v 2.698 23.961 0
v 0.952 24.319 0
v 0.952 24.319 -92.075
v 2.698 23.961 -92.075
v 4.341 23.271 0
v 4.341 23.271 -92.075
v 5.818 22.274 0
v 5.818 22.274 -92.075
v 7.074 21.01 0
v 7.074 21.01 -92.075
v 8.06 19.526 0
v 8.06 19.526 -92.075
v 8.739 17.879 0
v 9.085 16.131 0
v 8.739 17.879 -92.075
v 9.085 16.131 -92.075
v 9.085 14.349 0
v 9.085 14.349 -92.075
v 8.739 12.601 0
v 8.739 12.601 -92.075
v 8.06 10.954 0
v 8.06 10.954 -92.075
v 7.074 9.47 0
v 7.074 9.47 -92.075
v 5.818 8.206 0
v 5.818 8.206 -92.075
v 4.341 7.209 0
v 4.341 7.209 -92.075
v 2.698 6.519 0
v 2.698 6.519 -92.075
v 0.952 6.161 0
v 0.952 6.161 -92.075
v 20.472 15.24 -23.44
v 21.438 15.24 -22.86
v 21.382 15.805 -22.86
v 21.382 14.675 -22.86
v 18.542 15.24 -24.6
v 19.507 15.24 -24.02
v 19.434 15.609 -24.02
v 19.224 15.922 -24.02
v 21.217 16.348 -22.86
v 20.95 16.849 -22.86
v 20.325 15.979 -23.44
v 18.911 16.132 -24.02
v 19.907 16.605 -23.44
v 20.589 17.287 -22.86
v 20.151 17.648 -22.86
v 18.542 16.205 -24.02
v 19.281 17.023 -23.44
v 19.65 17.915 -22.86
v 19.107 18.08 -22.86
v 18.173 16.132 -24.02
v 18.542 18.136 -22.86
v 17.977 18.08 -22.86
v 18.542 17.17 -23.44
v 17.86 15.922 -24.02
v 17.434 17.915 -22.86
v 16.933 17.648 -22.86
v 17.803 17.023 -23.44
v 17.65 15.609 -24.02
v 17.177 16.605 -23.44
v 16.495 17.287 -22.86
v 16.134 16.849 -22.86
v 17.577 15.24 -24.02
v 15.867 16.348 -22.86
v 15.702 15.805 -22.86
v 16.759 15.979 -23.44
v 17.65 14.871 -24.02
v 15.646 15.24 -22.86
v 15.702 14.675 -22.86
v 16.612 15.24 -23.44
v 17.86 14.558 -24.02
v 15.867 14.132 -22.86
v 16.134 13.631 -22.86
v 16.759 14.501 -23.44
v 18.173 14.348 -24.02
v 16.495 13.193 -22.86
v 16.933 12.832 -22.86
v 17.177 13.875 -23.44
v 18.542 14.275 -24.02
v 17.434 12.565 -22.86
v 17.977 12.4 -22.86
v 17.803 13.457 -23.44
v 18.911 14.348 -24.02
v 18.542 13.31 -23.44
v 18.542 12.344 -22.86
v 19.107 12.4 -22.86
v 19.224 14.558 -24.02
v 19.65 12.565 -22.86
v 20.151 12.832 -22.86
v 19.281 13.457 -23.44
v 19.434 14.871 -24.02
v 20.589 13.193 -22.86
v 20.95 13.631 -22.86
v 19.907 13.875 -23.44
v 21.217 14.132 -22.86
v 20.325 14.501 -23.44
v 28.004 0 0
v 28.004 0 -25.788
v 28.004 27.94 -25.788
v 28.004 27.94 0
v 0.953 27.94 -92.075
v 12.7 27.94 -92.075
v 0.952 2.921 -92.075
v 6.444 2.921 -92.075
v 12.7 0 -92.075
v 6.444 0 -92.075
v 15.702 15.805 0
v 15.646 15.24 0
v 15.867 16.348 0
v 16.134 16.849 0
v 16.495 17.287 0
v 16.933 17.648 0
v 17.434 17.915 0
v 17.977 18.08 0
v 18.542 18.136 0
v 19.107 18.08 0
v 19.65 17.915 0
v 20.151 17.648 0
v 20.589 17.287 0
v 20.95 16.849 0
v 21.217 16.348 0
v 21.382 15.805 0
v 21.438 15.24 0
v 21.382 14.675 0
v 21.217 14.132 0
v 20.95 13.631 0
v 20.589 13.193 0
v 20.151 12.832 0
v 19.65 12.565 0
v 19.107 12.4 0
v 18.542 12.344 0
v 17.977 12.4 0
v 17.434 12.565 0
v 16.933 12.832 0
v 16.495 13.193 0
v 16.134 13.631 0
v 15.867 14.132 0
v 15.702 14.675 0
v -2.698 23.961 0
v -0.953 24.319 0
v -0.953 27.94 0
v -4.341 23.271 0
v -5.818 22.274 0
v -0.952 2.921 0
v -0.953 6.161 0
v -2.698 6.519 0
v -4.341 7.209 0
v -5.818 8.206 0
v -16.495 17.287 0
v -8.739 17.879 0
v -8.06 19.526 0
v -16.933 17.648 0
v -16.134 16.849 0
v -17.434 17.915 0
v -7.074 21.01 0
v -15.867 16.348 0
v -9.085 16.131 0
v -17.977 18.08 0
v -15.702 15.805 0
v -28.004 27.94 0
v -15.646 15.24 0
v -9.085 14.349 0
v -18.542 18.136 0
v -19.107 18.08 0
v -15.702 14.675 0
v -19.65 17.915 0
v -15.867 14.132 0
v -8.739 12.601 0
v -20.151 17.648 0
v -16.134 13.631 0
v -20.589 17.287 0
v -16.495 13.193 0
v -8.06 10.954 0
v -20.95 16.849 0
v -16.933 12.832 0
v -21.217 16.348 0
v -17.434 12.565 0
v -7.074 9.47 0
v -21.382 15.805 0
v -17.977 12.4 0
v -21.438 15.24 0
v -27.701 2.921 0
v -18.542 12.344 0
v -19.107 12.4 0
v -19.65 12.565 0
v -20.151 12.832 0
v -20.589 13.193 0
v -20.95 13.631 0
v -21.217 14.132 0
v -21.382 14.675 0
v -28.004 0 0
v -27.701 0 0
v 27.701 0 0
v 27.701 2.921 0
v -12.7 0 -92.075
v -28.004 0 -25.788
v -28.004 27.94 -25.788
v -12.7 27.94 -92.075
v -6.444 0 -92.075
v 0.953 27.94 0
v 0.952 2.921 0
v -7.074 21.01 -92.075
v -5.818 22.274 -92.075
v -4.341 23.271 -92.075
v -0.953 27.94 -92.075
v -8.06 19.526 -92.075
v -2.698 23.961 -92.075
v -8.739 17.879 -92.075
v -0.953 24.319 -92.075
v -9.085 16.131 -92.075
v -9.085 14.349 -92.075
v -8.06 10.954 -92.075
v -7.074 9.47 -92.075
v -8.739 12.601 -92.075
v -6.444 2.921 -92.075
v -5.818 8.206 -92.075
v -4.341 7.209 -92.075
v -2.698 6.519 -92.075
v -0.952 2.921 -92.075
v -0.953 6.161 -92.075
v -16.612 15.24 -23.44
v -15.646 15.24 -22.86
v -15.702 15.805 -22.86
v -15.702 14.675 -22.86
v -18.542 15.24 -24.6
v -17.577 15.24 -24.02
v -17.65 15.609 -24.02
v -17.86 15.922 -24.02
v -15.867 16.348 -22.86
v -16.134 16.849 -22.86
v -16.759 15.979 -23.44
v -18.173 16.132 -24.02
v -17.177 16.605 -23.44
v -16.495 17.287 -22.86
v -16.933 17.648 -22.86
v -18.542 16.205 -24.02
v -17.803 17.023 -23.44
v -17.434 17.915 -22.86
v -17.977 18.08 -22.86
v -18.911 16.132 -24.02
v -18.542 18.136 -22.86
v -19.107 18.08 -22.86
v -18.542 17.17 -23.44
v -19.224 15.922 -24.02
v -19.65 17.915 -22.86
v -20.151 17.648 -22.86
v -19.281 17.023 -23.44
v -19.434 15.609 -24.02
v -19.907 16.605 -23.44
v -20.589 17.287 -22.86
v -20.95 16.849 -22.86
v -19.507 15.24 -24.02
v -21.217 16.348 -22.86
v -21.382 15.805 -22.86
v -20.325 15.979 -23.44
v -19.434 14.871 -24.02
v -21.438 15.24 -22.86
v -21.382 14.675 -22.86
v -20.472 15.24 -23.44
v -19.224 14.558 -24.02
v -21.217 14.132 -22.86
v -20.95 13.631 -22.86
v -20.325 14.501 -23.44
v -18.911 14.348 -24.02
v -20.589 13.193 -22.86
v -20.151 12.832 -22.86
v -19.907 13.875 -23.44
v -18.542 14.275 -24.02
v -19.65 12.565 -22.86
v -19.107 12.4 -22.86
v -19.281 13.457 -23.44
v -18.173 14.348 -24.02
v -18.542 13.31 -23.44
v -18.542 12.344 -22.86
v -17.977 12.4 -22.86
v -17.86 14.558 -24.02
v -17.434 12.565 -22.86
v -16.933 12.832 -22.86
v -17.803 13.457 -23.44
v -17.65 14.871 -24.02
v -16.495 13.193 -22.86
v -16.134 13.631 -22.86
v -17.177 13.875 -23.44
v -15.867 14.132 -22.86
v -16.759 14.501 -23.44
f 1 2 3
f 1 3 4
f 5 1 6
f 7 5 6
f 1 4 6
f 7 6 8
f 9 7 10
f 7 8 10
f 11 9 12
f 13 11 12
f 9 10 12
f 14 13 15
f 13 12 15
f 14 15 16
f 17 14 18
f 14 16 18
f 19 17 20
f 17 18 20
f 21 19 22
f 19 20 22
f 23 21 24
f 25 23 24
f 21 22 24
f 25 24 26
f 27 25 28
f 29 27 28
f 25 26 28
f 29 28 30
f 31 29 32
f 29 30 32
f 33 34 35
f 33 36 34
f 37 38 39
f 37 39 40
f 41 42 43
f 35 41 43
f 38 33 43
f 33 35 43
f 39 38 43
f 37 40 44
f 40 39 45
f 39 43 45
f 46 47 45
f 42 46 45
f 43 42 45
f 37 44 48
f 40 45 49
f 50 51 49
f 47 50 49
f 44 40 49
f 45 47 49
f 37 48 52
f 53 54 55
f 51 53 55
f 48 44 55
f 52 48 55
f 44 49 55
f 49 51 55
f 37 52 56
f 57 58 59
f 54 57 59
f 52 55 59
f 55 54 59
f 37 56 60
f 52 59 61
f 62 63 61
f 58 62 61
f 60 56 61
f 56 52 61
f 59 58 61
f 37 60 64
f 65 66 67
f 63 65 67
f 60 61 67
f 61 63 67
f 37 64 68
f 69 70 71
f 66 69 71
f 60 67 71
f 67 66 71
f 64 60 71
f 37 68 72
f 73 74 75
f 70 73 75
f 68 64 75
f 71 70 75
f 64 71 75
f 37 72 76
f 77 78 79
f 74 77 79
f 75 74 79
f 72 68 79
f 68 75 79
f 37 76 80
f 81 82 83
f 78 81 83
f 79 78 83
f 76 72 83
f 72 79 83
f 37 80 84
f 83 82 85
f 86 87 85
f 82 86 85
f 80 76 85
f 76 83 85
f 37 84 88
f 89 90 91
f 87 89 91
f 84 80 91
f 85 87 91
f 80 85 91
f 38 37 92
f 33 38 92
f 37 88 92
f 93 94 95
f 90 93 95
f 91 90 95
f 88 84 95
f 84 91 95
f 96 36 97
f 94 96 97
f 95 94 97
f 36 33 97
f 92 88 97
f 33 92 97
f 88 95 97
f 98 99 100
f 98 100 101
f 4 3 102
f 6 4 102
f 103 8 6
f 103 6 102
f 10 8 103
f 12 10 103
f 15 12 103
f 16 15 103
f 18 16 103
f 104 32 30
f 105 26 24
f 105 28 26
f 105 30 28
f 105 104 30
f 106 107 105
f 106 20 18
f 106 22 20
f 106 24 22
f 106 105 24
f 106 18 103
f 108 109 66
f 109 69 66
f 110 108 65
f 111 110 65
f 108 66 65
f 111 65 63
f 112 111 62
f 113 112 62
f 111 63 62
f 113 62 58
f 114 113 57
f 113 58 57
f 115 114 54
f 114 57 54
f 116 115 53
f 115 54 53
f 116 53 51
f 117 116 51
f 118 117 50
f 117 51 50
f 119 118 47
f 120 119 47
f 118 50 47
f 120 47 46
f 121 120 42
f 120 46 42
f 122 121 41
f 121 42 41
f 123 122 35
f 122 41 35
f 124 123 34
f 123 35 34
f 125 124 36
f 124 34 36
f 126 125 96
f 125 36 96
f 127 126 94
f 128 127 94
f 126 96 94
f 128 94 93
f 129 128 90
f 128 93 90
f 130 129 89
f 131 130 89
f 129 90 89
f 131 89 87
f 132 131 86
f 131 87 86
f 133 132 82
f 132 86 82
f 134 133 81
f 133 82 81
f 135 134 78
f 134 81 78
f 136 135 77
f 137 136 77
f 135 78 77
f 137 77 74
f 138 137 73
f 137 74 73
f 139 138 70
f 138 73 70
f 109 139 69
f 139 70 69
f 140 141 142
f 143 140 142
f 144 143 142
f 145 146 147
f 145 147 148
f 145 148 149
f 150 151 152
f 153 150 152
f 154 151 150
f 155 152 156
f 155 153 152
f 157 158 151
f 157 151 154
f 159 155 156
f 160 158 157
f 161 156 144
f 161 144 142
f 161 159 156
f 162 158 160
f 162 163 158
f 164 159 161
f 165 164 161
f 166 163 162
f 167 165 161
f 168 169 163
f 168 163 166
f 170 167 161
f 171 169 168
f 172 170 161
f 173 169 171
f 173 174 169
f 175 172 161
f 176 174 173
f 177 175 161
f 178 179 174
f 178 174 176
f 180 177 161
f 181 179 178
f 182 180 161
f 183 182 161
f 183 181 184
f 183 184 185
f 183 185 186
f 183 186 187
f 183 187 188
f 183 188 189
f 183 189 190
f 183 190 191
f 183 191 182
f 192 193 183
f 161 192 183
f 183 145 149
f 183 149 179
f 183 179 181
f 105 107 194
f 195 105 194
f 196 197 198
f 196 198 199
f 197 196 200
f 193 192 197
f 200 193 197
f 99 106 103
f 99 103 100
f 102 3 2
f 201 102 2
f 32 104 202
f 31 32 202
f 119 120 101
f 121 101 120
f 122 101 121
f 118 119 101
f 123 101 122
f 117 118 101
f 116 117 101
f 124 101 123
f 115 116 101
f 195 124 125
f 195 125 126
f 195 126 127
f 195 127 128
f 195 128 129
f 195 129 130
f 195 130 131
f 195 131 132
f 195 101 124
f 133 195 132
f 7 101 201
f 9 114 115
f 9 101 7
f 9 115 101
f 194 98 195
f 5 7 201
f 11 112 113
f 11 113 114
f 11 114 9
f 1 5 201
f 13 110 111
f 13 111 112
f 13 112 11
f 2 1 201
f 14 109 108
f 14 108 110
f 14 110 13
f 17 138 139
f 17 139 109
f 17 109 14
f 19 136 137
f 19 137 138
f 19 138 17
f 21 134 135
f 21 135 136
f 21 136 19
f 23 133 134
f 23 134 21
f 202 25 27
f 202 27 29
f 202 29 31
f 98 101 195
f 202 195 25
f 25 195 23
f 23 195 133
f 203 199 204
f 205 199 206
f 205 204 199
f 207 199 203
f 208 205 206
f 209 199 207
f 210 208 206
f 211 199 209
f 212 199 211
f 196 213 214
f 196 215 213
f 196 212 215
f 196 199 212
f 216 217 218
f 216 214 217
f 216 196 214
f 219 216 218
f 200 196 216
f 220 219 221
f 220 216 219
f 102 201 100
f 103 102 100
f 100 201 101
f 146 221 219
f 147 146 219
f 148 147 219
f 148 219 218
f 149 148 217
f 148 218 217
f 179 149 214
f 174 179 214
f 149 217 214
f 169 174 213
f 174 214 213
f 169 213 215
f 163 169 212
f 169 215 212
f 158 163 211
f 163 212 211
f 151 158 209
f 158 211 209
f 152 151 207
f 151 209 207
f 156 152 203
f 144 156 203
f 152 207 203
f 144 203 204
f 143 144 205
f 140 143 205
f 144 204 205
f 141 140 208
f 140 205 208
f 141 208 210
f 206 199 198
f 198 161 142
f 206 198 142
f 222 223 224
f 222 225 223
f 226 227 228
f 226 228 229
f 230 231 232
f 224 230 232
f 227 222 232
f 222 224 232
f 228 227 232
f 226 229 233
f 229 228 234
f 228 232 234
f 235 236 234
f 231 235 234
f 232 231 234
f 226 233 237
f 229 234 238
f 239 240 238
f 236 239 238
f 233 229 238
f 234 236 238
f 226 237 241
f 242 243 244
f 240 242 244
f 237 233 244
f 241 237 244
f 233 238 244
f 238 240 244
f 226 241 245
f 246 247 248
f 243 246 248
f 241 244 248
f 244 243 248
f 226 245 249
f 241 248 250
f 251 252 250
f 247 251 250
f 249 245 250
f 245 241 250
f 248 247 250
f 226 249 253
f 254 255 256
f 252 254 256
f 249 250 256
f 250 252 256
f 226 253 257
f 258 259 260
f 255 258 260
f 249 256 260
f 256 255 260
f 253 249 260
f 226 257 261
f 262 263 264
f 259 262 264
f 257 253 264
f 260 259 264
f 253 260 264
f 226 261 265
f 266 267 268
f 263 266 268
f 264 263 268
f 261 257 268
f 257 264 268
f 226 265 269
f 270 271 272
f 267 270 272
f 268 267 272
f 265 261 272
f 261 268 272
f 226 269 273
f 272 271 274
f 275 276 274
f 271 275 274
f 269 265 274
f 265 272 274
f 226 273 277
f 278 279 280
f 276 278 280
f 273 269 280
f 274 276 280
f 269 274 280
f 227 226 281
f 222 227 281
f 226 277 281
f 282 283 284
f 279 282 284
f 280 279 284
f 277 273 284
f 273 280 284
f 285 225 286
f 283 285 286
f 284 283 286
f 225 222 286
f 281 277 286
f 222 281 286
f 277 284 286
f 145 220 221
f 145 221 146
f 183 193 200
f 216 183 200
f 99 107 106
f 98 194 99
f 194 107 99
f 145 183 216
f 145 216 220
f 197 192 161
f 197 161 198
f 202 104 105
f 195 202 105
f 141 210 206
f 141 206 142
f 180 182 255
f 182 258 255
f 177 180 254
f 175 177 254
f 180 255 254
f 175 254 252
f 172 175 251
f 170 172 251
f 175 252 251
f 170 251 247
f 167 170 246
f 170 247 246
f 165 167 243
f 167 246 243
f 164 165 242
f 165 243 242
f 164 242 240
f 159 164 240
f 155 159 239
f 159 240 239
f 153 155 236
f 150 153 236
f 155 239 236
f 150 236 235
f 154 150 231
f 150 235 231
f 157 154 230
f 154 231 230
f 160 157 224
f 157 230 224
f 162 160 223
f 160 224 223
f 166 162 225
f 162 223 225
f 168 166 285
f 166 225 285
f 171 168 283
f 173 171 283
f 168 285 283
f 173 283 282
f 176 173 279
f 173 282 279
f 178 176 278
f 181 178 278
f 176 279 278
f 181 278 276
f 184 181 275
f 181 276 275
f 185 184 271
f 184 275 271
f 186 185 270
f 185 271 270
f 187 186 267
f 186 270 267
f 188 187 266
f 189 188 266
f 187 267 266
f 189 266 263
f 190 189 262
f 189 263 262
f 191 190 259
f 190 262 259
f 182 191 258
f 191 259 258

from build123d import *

# Parameters (mm, degrees)
F1_DEPTH = 27.94
F3_DEPTH = 2.921
F5_D     = 5.7912
F5_DEPTH = 22.86
F5_TIP   = 1.7398520085
F7_D     = 18.25752
F8_W     = 1.905
F8_H     = 92.075
F9_DEPTH = 25.02


with BuildPart() as f1:
    # F0 (on Front) → F1 (new body)
    with BuildSketch(Plane.XZ):
        Polygon((28.0035, 0), (-28.0035, 0), (-28.0035, -25.7882589579), (-12.7, -92.075), (12.7, -92.075), (28.0035, -25.7882589579), align=None)
    extrude(amount=-F1_DEPTH)

    # F2 (on face) → F3 (cut)
    with BuildSketch(Plane.XZ):
        Polygon((-27.7008388568, 0), (-6.4436501589, -92.075), (6.4436501589, -92.075), (27.7008388568, 0), align=None)
    extrude(amount=-F3_DEPTH, mode=Mode.SUBTRACT)

    # F5
    with Locations(Plane.XY):
        with Locations((-18.542, 15.24), (18.542, 15.24)):
            Hole(F5_D / 2, depth=F5_DEPTH)
            with Locations((0, 0, -(F5_DEPTH + F5_TIP / 2))):  # 118° drill point
                Cone(0, F5_D / 2, F5_TIP, mode=Mode.SUBTRACT)

    # F7 (through all)
    with Locations(Plane.XY):
        with Locations((0, 15.24)):
            Hole(F7_D / 2)

    # F8 (on face) → F9 (cut, through all)
    with BuildSketch(Plane.XZ.offset(-2.921)):
        with Locations((0, -46.0375)):
            Rectangle(F8_W, F8_H)
    extrude(amount=-F9_DEPTH, mode=Mode.SUBTRACT)


solid = f1.part
